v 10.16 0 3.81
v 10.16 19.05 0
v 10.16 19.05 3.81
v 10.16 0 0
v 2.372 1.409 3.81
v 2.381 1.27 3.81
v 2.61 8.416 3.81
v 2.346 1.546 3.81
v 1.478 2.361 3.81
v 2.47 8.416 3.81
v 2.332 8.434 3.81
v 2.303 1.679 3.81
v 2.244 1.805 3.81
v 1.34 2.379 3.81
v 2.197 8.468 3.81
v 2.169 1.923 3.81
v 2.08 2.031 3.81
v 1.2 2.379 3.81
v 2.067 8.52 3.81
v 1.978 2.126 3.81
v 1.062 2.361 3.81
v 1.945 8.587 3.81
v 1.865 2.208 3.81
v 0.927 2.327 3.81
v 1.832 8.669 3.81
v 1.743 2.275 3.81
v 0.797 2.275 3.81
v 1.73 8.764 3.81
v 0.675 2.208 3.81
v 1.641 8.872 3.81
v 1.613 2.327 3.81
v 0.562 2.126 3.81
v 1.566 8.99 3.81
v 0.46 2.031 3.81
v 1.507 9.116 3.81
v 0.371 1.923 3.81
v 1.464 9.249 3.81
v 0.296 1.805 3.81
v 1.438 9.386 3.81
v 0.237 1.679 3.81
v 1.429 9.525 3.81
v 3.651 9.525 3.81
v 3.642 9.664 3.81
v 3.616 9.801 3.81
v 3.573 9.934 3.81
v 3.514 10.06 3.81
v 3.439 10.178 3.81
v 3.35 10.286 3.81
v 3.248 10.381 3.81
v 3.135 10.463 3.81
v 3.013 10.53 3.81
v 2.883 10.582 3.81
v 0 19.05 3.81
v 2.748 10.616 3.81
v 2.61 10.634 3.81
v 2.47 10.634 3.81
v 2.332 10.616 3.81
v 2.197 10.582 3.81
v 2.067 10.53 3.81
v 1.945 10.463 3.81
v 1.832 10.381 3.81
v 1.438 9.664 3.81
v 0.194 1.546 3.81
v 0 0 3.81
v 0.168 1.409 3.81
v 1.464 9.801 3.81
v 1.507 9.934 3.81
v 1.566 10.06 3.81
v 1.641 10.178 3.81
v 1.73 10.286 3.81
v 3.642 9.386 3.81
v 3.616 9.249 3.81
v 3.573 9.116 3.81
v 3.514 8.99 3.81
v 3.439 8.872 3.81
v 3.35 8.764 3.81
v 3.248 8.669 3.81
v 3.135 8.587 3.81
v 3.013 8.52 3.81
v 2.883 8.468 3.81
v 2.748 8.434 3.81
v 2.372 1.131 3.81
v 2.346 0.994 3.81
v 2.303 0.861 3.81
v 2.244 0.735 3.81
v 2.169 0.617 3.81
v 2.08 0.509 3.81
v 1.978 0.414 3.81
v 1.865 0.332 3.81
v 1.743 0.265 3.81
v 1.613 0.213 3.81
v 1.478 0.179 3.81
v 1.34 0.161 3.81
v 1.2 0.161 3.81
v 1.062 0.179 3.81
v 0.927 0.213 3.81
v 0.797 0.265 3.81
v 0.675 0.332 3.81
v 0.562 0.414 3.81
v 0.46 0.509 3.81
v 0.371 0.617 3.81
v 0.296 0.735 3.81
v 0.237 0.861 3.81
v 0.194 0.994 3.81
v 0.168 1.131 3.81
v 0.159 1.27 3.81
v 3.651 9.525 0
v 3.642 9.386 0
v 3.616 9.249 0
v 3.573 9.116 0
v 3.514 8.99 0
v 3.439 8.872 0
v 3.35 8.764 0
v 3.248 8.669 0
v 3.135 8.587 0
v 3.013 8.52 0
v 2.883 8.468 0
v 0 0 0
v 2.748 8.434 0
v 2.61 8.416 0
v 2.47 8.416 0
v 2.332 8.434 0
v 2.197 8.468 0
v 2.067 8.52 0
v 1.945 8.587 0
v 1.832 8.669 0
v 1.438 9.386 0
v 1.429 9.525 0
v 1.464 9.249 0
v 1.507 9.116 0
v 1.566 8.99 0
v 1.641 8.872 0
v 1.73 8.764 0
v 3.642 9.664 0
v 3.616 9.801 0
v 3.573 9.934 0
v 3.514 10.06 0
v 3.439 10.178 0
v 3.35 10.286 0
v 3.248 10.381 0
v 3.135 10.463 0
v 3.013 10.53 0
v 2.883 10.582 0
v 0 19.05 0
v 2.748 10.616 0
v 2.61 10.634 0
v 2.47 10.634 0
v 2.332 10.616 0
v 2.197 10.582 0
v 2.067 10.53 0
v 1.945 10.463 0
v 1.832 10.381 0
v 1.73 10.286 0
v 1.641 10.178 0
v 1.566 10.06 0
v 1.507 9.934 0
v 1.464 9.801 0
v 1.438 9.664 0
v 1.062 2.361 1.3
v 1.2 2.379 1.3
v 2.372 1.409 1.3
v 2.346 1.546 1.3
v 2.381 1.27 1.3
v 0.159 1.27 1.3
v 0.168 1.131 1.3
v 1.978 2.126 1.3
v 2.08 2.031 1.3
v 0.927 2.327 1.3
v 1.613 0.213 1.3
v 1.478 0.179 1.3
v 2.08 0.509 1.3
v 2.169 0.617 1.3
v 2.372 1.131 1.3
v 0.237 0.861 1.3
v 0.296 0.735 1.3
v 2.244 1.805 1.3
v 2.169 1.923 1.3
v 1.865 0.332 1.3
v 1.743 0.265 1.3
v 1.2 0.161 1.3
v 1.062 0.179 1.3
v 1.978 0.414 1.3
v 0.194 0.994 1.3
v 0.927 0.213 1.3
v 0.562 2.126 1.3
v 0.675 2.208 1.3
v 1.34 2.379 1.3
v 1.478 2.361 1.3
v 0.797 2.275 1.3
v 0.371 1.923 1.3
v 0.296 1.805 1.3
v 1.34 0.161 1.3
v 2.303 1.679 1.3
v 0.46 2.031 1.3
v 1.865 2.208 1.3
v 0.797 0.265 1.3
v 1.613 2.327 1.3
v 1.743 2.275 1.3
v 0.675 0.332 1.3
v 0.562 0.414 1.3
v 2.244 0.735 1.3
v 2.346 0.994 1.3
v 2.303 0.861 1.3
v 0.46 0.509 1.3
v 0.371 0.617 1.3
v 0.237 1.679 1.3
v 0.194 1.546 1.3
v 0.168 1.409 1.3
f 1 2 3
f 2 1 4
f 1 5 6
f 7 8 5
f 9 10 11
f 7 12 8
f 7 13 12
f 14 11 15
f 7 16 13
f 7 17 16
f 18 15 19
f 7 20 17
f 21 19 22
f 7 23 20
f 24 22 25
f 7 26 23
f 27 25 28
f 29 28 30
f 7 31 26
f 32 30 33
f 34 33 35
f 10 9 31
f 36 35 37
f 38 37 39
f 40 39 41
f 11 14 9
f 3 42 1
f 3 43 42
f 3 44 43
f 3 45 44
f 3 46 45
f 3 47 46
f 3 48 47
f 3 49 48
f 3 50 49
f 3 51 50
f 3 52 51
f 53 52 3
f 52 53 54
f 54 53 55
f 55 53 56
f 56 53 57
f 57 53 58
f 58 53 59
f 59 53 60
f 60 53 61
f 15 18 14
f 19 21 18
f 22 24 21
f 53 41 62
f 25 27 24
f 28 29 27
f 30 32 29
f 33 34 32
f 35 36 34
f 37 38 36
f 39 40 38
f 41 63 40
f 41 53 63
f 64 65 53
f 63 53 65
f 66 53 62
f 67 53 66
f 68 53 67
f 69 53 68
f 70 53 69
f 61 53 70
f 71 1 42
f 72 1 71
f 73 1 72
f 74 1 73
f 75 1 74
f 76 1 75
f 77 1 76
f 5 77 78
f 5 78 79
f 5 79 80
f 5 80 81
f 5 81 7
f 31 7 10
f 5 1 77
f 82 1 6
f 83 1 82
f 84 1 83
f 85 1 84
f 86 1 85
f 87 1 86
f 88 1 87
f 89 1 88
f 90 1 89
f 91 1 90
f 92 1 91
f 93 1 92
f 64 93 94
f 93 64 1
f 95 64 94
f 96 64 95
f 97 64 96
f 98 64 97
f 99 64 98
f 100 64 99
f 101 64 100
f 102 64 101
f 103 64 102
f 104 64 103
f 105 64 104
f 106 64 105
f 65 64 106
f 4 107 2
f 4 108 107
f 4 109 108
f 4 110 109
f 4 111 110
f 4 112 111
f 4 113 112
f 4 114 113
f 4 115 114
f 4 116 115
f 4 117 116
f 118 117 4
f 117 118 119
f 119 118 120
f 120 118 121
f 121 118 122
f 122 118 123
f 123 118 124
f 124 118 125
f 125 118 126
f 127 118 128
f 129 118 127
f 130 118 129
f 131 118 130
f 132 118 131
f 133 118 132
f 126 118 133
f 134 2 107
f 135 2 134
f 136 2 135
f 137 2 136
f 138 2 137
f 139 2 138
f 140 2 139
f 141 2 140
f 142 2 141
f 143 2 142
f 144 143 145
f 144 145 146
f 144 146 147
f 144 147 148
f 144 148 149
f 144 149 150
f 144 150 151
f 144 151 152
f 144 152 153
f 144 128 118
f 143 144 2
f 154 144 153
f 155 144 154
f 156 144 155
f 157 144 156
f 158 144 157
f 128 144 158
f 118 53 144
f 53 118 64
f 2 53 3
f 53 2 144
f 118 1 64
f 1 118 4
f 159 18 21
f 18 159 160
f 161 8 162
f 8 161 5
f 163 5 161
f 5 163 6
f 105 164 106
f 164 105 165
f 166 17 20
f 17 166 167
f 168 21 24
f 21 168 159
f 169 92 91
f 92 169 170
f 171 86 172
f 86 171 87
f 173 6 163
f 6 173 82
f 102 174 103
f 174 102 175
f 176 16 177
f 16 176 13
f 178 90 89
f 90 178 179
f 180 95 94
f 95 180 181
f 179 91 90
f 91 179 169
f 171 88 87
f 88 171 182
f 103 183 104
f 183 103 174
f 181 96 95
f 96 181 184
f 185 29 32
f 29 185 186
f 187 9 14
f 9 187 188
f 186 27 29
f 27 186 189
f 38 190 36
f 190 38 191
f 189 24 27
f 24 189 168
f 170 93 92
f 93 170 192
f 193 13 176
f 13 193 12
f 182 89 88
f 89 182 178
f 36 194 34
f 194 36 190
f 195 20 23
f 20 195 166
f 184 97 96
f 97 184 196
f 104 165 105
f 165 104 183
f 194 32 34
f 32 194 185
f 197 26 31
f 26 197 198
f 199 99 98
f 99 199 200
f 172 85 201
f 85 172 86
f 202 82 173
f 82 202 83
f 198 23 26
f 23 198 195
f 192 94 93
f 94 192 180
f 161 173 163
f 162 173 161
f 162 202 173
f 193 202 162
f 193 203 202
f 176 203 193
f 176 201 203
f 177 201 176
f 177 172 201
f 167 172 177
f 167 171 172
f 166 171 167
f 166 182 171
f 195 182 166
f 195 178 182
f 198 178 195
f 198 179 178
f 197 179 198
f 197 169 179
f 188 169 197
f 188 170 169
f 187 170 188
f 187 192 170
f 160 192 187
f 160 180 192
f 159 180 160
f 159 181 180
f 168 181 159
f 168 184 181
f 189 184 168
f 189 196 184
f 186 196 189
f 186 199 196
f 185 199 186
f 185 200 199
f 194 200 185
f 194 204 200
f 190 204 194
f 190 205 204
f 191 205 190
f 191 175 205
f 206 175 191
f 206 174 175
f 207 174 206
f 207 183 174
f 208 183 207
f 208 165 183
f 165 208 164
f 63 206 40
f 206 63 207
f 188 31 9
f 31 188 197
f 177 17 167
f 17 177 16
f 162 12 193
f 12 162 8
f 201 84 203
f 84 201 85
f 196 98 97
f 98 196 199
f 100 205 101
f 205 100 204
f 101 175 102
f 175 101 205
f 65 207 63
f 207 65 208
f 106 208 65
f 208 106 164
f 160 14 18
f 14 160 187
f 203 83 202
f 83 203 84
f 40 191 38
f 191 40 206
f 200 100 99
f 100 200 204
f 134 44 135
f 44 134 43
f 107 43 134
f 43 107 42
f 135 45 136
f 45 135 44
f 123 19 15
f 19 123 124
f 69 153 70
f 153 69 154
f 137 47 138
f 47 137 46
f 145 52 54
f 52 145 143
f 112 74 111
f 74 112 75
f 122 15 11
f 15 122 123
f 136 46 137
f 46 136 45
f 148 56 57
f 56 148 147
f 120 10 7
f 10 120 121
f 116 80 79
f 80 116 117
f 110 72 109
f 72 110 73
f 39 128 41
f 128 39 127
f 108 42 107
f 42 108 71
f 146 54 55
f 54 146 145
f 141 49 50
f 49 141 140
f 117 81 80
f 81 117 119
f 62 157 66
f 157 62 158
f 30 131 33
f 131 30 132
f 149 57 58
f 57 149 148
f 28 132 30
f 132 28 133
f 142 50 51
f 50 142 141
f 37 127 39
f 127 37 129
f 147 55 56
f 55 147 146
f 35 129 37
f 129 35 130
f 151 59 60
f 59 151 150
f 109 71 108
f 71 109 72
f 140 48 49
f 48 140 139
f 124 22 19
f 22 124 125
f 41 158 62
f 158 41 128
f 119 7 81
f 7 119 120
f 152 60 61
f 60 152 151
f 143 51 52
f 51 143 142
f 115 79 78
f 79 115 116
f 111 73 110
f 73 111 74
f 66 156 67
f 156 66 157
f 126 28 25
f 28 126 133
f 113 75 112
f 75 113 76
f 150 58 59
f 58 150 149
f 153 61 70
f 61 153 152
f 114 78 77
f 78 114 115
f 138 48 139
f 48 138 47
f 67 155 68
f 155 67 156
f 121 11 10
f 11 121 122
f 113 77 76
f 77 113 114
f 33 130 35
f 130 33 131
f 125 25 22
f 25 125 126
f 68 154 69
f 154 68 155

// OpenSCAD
// MIT LICENSE
// Aft Deck Component


difference(){
cube([10.16, 19.05, 3.81]);

translate([1.27, 1.27, 1.30]){
	cylinder(h=2.54, d=2.2223, center=false, $fn=50);
}

translate([2.54, 9.525, 0]){
	cylinder(h=4, d=2.2223, center=false, $fn=50);
}
}
